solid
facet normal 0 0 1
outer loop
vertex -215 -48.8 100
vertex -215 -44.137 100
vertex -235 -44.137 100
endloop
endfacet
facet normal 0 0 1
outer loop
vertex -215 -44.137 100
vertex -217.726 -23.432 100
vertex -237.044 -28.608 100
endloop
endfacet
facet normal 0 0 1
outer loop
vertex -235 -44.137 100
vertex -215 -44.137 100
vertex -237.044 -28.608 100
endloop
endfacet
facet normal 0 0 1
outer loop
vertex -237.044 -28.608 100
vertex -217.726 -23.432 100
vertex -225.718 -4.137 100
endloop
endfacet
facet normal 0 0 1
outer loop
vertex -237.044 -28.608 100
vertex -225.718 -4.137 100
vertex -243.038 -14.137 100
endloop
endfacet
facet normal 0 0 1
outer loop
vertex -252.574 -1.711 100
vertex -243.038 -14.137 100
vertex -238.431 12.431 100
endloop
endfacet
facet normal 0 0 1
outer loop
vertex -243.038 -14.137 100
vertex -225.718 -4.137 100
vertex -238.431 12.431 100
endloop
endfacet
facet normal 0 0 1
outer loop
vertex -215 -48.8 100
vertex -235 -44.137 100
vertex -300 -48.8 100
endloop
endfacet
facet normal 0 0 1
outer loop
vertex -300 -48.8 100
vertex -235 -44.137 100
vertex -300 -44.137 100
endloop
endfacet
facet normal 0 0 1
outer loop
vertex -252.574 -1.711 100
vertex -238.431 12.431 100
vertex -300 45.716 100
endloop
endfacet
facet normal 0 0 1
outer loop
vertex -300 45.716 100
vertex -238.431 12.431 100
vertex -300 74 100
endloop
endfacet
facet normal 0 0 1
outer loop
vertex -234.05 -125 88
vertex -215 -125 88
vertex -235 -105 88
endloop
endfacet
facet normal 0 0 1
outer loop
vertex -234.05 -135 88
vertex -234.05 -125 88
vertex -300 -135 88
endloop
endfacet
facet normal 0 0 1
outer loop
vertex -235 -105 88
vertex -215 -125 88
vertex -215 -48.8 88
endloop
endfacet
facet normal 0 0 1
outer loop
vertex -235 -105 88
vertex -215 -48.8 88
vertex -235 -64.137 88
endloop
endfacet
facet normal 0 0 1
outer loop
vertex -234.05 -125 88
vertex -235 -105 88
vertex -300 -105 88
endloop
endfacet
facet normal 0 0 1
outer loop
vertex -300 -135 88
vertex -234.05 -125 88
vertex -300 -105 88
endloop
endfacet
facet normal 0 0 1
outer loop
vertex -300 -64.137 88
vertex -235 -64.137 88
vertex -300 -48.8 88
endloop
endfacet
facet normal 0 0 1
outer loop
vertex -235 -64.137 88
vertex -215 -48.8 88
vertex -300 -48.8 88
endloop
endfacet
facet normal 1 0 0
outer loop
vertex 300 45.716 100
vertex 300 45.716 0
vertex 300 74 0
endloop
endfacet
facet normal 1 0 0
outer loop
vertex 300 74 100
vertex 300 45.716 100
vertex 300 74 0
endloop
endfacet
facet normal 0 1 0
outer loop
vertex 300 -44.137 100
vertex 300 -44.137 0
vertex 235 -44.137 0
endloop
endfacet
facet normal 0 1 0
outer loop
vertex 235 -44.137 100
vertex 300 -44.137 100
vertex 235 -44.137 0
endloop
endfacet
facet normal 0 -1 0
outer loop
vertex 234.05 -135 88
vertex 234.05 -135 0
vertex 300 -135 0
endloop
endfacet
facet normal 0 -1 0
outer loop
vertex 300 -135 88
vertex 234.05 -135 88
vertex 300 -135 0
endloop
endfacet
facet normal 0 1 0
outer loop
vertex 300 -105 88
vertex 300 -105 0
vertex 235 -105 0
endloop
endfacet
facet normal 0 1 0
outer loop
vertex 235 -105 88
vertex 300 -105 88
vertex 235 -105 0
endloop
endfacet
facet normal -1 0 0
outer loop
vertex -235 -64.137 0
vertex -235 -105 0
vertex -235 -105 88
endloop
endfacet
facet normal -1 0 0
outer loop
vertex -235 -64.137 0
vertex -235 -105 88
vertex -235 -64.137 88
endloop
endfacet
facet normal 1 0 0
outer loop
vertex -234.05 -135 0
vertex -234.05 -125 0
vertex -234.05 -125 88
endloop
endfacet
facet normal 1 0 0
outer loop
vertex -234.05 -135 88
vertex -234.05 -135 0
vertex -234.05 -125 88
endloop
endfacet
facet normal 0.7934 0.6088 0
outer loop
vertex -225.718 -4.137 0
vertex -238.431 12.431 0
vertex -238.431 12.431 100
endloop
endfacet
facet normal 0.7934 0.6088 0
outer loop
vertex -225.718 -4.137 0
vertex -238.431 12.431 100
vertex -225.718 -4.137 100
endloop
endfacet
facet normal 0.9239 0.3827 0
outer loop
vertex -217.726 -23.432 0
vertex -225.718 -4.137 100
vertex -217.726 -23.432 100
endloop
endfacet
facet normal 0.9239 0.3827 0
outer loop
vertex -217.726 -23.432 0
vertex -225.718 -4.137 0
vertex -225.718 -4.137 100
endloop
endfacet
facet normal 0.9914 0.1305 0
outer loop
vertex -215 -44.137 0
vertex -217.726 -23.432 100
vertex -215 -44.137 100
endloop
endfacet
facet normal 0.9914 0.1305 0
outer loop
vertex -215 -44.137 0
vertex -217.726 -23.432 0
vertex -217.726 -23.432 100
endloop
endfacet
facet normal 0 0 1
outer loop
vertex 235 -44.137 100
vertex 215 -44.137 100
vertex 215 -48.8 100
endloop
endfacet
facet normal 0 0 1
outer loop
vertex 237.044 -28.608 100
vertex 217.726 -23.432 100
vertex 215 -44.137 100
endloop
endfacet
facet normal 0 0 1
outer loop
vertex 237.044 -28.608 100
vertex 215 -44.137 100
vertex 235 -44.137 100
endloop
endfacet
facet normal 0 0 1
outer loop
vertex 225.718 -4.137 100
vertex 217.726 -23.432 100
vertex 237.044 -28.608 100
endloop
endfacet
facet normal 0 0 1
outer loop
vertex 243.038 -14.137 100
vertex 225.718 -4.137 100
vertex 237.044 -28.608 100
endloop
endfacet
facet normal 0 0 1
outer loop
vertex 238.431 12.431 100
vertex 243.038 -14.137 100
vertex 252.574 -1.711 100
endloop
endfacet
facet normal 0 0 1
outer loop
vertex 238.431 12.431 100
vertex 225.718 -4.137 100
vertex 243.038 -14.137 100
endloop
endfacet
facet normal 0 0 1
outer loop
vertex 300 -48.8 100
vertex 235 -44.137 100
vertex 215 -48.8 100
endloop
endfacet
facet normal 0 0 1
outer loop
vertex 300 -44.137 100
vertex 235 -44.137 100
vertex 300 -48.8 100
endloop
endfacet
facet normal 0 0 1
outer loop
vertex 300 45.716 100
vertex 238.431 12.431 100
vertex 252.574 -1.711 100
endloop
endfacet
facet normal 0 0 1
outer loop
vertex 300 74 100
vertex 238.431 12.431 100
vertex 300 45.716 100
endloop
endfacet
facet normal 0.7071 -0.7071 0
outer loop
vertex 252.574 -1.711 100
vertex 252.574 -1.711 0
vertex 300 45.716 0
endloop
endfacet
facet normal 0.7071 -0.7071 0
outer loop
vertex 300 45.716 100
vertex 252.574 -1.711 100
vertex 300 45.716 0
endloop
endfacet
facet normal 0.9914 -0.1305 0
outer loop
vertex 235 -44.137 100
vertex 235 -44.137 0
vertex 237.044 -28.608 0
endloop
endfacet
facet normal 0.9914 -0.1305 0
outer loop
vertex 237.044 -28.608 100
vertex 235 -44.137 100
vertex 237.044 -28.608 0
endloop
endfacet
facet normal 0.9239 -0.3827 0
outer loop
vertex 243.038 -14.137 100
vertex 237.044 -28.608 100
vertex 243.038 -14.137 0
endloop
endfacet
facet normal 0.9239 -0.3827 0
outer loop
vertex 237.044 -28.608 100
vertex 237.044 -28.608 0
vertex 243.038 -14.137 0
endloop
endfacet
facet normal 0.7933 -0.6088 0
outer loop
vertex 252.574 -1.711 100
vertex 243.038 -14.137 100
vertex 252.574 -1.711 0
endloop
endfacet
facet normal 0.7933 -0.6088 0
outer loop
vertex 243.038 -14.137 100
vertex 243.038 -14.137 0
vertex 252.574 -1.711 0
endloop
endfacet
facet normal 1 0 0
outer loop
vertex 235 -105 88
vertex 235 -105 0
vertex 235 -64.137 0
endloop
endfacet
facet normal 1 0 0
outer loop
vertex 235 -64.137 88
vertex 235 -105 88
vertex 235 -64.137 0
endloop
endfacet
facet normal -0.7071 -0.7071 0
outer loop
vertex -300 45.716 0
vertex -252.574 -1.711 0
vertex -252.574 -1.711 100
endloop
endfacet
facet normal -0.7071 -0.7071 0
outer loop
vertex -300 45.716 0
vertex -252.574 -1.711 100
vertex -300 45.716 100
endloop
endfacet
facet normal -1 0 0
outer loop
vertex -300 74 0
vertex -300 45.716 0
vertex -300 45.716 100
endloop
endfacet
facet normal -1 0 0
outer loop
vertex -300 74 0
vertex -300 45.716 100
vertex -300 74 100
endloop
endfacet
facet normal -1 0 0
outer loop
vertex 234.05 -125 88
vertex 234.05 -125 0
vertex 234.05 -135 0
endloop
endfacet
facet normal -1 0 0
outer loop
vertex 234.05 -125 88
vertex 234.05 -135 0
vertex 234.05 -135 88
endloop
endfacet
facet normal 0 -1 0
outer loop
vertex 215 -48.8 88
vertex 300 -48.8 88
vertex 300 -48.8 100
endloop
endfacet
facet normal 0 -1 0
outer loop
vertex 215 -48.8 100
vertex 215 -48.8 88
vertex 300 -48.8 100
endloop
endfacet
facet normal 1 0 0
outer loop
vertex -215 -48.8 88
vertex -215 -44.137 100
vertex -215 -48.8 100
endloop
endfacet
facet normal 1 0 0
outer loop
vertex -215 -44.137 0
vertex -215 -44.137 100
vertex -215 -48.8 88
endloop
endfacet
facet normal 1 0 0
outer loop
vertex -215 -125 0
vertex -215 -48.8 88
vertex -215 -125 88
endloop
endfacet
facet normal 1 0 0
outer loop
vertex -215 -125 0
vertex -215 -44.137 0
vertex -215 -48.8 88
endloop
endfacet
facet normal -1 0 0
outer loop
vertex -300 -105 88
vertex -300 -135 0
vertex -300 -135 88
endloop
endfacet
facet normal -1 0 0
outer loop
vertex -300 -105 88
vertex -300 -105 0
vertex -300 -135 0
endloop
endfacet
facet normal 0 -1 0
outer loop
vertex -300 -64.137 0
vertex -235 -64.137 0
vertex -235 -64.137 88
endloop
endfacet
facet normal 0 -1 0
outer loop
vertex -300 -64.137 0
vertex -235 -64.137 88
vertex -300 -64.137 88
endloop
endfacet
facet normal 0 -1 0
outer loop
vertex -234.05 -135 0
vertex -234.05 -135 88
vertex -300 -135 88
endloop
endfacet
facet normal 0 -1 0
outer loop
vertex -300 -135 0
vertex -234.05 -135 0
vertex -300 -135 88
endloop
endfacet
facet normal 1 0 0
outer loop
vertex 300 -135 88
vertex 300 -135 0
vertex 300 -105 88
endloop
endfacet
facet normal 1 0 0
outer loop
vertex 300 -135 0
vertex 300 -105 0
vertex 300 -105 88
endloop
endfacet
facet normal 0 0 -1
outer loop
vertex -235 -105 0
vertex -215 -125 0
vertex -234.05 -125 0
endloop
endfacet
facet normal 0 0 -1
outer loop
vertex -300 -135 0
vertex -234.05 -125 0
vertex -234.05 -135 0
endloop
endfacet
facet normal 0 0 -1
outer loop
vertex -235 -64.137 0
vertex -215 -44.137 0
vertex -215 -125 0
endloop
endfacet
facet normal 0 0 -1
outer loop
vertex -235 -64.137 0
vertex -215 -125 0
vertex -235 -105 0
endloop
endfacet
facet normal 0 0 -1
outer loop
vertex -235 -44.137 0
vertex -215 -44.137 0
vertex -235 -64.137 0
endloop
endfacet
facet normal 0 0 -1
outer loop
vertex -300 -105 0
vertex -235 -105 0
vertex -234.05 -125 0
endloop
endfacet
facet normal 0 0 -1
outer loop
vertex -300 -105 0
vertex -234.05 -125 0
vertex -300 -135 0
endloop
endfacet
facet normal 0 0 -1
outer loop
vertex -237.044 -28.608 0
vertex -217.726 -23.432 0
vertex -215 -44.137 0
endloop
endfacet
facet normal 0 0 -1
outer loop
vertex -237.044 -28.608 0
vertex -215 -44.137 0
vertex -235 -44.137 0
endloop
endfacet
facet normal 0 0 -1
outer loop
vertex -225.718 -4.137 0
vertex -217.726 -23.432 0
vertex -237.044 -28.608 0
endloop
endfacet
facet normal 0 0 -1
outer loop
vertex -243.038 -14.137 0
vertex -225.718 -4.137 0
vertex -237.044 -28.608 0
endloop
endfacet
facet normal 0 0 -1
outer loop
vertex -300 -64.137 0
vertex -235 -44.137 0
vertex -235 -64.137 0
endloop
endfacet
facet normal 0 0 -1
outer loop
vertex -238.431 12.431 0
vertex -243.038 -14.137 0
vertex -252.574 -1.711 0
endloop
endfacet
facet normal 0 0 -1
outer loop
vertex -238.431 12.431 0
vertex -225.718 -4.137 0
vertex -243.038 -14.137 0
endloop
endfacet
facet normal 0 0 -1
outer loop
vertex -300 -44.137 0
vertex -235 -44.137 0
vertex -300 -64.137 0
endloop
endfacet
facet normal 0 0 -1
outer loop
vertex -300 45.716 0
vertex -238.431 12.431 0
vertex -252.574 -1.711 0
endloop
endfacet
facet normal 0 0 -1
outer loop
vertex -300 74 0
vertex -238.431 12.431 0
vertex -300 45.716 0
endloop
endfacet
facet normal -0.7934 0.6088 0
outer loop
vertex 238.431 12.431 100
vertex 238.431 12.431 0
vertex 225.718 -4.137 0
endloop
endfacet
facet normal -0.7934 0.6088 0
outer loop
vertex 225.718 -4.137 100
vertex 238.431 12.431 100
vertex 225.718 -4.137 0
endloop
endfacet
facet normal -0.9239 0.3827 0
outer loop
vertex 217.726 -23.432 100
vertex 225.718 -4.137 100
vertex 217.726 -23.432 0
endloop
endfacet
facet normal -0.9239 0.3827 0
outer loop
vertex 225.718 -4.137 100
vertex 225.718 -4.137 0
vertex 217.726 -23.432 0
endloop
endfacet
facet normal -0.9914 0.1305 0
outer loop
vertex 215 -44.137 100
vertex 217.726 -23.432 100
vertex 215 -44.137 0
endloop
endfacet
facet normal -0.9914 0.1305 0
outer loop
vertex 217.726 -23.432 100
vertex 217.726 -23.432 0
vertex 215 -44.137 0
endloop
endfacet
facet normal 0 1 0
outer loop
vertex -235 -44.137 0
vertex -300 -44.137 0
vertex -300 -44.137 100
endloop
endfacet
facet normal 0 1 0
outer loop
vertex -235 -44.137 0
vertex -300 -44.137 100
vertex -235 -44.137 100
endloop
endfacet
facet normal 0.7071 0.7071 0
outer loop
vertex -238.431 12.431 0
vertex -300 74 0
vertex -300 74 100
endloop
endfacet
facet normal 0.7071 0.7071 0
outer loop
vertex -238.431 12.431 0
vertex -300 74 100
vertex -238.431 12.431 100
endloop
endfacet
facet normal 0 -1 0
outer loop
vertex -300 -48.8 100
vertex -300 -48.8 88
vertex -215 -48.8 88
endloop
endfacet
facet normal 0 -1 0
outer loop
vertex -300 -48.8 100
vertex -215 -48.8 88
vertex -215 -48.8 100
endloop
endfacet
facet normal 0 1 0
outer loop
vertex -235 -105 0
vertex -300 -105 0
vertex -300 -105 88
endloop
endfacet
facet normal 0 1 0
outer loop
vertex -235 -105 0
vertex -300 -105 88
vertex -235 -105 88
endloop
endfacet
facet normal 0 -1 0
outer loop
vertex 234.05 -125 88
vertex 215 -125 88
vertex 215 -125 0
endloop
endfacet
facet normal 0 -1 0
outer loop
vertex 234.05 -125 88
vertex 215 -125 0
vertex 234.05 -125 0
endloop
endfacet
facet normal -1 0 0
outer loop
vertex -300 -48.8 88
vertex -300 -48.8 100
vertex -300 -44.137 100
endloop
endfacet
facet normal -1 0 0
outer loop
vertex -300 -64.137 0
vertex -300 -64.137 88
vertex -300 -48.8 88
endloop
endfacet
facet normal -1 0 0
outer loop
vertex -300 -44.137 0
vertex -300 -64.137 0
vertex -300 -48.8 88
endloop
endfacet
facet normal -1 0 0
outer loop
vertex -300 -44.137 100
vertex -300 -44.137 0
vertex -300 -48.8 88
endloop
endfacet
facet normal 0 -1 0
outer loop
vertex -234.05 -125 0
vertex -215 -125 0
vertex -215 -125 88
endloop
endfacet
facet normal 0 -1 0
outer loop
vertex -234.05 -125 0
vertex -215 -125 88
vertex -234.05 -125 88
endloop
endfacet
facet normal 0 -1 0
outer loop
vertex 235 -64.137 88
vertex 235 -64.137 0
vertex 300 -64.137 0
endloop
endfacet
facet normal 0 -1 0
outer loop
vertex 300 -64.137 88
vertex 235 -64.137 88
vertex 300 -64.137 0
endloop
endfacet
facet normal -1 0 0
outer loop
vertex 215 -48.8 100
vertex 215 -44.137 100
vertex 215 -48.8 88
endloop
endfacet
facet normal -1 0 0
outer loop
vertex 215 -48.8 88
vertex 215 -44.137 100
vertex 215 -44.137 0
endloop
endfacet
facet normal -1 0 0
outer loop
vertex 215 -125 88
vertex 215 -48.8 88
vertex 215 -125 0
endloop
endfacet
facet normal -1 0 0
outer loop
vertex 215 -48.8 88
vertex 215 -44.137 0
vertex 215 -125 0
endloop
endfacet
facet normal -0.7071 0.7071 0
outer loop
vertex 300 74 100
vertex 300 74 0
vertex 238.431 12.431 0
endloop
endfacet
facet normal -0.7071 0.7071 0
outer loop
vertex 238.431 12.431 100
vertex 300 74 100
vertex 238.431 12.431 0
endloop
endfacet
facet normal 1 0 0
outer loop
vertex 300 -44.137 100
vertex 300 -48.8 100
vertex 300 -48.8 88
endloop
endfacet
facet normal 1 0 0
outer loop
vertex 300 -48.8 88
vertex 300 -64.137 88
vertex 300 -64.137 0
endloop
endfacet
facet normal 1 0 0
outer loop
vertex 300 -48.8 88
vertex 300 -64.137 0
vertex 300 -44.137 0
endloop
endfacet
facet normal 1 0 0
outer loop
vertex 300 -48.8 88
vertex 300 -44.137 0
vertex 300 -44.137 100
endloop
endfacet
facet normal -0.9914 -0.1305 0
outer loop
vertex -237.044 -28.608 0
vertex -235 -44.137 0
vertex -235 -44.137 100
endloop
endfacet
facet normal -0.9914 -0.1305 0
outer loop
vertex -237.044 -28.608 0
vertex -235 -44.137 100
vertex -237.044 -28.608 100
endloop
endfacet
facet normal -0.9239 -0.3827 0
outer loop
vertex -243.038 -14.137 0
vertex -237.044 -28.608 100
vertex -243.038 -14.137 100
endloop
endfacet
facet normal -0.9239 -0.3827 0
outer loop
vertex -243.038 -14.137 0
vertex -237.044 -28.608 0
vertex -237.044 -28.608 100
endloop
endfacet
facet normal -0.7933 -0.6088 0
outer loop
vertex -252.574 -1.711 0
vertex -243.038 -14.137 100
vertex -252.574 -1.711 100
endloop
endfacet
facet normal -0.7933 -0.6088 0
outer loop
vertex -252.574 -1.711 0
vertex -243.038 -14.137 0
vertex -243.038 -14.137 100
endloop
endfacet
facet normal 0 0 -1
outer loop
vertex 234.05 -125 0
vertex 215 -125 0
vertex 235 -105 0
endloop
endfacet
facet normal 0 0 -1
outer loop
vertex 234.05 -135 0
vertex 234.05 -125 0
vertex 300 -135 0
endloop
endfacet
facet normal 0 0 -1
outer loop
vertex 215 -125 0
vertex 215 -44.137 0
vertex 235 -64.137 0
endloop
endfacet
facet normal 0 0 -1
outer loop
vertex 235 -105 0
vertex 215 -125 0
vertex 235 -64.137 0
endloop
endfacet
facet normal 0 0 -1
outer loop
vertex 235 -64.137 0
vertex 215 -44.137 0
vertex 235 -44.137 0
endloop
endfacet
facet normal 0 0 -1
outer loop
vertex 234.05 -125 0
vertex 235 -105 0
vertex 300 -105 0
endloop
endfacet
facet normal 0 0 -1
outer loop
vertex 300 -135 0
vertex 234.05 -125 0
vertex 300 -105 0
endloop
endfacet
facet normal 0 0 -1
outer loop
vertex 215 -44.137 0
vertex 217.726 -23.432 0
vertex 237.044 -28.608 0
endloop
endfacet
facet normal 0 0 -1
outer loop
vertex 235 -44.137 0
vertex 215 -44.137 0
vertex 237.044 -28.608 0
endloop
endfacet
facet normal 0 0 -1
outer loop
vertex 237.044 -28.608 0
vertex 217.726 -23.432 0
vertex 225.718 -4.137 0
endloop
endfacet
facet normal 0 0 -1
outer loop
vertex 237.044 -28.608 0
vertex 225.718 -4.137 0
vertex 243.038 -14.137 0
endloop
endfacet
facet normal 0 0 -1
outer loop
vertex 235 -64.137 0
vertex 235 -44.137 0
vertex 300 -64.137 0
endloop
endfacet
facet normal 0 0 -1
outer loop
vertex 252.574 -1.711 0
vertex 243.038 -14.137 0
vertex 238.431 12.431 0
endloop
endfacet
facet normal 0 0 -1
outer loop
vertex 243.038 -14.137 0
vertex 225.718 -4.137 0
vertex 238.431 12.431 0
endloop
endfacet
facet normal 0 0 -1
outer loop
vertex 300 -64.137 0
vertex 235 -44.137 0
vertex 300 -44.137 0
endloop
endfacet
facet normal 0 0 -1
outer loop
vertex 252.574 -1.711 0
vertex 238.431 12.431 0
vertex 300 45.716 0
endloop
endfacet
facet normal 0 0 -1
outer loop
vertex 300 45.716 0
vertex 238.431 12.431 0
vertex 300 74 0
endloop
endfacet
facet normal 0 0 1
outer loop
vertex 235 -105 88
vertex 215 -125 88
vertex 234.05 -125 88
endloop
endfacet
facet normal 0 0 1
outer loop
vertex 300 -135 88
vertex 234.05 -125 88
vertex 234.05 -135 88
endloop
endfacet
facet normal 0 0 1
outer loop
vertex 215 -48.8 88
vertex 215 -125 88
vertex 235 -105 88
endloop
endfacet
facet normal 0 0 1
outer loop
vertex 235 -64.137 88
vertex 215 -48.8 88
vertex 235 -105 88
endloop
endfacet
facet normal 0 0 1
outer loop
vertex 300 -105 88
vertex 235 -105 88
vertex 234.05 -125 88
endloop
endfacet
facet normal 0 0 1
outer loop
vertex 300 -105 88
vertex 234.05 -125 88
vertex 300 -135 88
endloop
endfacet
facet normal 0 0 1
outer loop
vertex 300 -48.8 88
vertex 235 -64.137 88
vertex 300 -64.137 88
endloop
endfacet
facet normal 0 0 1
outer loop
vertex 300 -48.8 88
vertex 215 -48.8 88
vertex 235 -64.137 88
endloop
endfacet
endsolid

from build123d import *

# Parameters (mm, degrees)
BOSS_EXTRUDE1_DEPTH = 100
SKETCH2_W           = 12
SKETCH2_H           = 76.2
CUT_EXTRUDE1_DEPTH  = 182.245689604
SKETCH3_W           = 65.95
SKETCH3_H           = 88
BOSS_EXTRUDE2_DEPTH = 10


with BuildPart() as part:
    # Sketch1 → Boss-Extrude1 (new body)
    with BuildSketch(Plane.XY):
        with BuildLine():
            Line((300, 74), (238.431457505, 12.431457505))
            ThreePointArc((238.431457505, 12.431457505), (221.089637399, -13.522410401), (215, -44.13708499))
            Line((215, -44.13708499), (215, -105))
            Line((215, -105), (215, -125))
            Line((215, -125), (234.05, -125))
            Line((234.05, -125), (300, -125))
            Line((300, -125), (300, -105))
            Line((300, -105), (235, -105))
            Line((235, -105), (235, -64.13708499))
            Line((235, -64.13708499), (300, -64.13708499))
            Line((300, -64.13708499), (300, -44.13708499))
            Line((300, -44.13708499), (235, -44.13708499))
            ThreePointArc((235, -44.13708499), (239.567228049, -21.176079048), (252.573593129, -1.710678119))
            Line((252.573593129, -1.710678119), (300, 45.715728753))
            Line((300, 45.715728753), (300, 74))
        make_face()
    extrude(amount=BOSS_EXTRUDE1_DEPTH)

    # Sketch2 → Cut-Extrude1 (cut, through all)
    with BuildSketch(Plane.ZY.offset(-215)):
        with Locations((94, -86.9)):
            Rectangle(SKETCH2_W, SKETCH2_H)
    extrude(amount=-CUT_EXTRUDE1_DEPTH, mode=Mode.SUBTRACT)

    # Sketch3 → Boss-Extrude2 (add)
    with BuildSketch(Plane.XZ.offset(125)):
        with Locations((267.025, 44)):
            Rectangle(SKETCH3_W, SKETCH3_H)
    extrude(amount=BOSS_EXTRUDE2_DEPTH)


with BuildPart() as body_2:
    # Mirror1: mirrored copy
    add(part.part.mirror(Plane(origin=(0, 0, 0), x_dir=(0, 0, 1), z_dir=(1, 0, 0))))


solid = Compound([part.part, body_2.part])
